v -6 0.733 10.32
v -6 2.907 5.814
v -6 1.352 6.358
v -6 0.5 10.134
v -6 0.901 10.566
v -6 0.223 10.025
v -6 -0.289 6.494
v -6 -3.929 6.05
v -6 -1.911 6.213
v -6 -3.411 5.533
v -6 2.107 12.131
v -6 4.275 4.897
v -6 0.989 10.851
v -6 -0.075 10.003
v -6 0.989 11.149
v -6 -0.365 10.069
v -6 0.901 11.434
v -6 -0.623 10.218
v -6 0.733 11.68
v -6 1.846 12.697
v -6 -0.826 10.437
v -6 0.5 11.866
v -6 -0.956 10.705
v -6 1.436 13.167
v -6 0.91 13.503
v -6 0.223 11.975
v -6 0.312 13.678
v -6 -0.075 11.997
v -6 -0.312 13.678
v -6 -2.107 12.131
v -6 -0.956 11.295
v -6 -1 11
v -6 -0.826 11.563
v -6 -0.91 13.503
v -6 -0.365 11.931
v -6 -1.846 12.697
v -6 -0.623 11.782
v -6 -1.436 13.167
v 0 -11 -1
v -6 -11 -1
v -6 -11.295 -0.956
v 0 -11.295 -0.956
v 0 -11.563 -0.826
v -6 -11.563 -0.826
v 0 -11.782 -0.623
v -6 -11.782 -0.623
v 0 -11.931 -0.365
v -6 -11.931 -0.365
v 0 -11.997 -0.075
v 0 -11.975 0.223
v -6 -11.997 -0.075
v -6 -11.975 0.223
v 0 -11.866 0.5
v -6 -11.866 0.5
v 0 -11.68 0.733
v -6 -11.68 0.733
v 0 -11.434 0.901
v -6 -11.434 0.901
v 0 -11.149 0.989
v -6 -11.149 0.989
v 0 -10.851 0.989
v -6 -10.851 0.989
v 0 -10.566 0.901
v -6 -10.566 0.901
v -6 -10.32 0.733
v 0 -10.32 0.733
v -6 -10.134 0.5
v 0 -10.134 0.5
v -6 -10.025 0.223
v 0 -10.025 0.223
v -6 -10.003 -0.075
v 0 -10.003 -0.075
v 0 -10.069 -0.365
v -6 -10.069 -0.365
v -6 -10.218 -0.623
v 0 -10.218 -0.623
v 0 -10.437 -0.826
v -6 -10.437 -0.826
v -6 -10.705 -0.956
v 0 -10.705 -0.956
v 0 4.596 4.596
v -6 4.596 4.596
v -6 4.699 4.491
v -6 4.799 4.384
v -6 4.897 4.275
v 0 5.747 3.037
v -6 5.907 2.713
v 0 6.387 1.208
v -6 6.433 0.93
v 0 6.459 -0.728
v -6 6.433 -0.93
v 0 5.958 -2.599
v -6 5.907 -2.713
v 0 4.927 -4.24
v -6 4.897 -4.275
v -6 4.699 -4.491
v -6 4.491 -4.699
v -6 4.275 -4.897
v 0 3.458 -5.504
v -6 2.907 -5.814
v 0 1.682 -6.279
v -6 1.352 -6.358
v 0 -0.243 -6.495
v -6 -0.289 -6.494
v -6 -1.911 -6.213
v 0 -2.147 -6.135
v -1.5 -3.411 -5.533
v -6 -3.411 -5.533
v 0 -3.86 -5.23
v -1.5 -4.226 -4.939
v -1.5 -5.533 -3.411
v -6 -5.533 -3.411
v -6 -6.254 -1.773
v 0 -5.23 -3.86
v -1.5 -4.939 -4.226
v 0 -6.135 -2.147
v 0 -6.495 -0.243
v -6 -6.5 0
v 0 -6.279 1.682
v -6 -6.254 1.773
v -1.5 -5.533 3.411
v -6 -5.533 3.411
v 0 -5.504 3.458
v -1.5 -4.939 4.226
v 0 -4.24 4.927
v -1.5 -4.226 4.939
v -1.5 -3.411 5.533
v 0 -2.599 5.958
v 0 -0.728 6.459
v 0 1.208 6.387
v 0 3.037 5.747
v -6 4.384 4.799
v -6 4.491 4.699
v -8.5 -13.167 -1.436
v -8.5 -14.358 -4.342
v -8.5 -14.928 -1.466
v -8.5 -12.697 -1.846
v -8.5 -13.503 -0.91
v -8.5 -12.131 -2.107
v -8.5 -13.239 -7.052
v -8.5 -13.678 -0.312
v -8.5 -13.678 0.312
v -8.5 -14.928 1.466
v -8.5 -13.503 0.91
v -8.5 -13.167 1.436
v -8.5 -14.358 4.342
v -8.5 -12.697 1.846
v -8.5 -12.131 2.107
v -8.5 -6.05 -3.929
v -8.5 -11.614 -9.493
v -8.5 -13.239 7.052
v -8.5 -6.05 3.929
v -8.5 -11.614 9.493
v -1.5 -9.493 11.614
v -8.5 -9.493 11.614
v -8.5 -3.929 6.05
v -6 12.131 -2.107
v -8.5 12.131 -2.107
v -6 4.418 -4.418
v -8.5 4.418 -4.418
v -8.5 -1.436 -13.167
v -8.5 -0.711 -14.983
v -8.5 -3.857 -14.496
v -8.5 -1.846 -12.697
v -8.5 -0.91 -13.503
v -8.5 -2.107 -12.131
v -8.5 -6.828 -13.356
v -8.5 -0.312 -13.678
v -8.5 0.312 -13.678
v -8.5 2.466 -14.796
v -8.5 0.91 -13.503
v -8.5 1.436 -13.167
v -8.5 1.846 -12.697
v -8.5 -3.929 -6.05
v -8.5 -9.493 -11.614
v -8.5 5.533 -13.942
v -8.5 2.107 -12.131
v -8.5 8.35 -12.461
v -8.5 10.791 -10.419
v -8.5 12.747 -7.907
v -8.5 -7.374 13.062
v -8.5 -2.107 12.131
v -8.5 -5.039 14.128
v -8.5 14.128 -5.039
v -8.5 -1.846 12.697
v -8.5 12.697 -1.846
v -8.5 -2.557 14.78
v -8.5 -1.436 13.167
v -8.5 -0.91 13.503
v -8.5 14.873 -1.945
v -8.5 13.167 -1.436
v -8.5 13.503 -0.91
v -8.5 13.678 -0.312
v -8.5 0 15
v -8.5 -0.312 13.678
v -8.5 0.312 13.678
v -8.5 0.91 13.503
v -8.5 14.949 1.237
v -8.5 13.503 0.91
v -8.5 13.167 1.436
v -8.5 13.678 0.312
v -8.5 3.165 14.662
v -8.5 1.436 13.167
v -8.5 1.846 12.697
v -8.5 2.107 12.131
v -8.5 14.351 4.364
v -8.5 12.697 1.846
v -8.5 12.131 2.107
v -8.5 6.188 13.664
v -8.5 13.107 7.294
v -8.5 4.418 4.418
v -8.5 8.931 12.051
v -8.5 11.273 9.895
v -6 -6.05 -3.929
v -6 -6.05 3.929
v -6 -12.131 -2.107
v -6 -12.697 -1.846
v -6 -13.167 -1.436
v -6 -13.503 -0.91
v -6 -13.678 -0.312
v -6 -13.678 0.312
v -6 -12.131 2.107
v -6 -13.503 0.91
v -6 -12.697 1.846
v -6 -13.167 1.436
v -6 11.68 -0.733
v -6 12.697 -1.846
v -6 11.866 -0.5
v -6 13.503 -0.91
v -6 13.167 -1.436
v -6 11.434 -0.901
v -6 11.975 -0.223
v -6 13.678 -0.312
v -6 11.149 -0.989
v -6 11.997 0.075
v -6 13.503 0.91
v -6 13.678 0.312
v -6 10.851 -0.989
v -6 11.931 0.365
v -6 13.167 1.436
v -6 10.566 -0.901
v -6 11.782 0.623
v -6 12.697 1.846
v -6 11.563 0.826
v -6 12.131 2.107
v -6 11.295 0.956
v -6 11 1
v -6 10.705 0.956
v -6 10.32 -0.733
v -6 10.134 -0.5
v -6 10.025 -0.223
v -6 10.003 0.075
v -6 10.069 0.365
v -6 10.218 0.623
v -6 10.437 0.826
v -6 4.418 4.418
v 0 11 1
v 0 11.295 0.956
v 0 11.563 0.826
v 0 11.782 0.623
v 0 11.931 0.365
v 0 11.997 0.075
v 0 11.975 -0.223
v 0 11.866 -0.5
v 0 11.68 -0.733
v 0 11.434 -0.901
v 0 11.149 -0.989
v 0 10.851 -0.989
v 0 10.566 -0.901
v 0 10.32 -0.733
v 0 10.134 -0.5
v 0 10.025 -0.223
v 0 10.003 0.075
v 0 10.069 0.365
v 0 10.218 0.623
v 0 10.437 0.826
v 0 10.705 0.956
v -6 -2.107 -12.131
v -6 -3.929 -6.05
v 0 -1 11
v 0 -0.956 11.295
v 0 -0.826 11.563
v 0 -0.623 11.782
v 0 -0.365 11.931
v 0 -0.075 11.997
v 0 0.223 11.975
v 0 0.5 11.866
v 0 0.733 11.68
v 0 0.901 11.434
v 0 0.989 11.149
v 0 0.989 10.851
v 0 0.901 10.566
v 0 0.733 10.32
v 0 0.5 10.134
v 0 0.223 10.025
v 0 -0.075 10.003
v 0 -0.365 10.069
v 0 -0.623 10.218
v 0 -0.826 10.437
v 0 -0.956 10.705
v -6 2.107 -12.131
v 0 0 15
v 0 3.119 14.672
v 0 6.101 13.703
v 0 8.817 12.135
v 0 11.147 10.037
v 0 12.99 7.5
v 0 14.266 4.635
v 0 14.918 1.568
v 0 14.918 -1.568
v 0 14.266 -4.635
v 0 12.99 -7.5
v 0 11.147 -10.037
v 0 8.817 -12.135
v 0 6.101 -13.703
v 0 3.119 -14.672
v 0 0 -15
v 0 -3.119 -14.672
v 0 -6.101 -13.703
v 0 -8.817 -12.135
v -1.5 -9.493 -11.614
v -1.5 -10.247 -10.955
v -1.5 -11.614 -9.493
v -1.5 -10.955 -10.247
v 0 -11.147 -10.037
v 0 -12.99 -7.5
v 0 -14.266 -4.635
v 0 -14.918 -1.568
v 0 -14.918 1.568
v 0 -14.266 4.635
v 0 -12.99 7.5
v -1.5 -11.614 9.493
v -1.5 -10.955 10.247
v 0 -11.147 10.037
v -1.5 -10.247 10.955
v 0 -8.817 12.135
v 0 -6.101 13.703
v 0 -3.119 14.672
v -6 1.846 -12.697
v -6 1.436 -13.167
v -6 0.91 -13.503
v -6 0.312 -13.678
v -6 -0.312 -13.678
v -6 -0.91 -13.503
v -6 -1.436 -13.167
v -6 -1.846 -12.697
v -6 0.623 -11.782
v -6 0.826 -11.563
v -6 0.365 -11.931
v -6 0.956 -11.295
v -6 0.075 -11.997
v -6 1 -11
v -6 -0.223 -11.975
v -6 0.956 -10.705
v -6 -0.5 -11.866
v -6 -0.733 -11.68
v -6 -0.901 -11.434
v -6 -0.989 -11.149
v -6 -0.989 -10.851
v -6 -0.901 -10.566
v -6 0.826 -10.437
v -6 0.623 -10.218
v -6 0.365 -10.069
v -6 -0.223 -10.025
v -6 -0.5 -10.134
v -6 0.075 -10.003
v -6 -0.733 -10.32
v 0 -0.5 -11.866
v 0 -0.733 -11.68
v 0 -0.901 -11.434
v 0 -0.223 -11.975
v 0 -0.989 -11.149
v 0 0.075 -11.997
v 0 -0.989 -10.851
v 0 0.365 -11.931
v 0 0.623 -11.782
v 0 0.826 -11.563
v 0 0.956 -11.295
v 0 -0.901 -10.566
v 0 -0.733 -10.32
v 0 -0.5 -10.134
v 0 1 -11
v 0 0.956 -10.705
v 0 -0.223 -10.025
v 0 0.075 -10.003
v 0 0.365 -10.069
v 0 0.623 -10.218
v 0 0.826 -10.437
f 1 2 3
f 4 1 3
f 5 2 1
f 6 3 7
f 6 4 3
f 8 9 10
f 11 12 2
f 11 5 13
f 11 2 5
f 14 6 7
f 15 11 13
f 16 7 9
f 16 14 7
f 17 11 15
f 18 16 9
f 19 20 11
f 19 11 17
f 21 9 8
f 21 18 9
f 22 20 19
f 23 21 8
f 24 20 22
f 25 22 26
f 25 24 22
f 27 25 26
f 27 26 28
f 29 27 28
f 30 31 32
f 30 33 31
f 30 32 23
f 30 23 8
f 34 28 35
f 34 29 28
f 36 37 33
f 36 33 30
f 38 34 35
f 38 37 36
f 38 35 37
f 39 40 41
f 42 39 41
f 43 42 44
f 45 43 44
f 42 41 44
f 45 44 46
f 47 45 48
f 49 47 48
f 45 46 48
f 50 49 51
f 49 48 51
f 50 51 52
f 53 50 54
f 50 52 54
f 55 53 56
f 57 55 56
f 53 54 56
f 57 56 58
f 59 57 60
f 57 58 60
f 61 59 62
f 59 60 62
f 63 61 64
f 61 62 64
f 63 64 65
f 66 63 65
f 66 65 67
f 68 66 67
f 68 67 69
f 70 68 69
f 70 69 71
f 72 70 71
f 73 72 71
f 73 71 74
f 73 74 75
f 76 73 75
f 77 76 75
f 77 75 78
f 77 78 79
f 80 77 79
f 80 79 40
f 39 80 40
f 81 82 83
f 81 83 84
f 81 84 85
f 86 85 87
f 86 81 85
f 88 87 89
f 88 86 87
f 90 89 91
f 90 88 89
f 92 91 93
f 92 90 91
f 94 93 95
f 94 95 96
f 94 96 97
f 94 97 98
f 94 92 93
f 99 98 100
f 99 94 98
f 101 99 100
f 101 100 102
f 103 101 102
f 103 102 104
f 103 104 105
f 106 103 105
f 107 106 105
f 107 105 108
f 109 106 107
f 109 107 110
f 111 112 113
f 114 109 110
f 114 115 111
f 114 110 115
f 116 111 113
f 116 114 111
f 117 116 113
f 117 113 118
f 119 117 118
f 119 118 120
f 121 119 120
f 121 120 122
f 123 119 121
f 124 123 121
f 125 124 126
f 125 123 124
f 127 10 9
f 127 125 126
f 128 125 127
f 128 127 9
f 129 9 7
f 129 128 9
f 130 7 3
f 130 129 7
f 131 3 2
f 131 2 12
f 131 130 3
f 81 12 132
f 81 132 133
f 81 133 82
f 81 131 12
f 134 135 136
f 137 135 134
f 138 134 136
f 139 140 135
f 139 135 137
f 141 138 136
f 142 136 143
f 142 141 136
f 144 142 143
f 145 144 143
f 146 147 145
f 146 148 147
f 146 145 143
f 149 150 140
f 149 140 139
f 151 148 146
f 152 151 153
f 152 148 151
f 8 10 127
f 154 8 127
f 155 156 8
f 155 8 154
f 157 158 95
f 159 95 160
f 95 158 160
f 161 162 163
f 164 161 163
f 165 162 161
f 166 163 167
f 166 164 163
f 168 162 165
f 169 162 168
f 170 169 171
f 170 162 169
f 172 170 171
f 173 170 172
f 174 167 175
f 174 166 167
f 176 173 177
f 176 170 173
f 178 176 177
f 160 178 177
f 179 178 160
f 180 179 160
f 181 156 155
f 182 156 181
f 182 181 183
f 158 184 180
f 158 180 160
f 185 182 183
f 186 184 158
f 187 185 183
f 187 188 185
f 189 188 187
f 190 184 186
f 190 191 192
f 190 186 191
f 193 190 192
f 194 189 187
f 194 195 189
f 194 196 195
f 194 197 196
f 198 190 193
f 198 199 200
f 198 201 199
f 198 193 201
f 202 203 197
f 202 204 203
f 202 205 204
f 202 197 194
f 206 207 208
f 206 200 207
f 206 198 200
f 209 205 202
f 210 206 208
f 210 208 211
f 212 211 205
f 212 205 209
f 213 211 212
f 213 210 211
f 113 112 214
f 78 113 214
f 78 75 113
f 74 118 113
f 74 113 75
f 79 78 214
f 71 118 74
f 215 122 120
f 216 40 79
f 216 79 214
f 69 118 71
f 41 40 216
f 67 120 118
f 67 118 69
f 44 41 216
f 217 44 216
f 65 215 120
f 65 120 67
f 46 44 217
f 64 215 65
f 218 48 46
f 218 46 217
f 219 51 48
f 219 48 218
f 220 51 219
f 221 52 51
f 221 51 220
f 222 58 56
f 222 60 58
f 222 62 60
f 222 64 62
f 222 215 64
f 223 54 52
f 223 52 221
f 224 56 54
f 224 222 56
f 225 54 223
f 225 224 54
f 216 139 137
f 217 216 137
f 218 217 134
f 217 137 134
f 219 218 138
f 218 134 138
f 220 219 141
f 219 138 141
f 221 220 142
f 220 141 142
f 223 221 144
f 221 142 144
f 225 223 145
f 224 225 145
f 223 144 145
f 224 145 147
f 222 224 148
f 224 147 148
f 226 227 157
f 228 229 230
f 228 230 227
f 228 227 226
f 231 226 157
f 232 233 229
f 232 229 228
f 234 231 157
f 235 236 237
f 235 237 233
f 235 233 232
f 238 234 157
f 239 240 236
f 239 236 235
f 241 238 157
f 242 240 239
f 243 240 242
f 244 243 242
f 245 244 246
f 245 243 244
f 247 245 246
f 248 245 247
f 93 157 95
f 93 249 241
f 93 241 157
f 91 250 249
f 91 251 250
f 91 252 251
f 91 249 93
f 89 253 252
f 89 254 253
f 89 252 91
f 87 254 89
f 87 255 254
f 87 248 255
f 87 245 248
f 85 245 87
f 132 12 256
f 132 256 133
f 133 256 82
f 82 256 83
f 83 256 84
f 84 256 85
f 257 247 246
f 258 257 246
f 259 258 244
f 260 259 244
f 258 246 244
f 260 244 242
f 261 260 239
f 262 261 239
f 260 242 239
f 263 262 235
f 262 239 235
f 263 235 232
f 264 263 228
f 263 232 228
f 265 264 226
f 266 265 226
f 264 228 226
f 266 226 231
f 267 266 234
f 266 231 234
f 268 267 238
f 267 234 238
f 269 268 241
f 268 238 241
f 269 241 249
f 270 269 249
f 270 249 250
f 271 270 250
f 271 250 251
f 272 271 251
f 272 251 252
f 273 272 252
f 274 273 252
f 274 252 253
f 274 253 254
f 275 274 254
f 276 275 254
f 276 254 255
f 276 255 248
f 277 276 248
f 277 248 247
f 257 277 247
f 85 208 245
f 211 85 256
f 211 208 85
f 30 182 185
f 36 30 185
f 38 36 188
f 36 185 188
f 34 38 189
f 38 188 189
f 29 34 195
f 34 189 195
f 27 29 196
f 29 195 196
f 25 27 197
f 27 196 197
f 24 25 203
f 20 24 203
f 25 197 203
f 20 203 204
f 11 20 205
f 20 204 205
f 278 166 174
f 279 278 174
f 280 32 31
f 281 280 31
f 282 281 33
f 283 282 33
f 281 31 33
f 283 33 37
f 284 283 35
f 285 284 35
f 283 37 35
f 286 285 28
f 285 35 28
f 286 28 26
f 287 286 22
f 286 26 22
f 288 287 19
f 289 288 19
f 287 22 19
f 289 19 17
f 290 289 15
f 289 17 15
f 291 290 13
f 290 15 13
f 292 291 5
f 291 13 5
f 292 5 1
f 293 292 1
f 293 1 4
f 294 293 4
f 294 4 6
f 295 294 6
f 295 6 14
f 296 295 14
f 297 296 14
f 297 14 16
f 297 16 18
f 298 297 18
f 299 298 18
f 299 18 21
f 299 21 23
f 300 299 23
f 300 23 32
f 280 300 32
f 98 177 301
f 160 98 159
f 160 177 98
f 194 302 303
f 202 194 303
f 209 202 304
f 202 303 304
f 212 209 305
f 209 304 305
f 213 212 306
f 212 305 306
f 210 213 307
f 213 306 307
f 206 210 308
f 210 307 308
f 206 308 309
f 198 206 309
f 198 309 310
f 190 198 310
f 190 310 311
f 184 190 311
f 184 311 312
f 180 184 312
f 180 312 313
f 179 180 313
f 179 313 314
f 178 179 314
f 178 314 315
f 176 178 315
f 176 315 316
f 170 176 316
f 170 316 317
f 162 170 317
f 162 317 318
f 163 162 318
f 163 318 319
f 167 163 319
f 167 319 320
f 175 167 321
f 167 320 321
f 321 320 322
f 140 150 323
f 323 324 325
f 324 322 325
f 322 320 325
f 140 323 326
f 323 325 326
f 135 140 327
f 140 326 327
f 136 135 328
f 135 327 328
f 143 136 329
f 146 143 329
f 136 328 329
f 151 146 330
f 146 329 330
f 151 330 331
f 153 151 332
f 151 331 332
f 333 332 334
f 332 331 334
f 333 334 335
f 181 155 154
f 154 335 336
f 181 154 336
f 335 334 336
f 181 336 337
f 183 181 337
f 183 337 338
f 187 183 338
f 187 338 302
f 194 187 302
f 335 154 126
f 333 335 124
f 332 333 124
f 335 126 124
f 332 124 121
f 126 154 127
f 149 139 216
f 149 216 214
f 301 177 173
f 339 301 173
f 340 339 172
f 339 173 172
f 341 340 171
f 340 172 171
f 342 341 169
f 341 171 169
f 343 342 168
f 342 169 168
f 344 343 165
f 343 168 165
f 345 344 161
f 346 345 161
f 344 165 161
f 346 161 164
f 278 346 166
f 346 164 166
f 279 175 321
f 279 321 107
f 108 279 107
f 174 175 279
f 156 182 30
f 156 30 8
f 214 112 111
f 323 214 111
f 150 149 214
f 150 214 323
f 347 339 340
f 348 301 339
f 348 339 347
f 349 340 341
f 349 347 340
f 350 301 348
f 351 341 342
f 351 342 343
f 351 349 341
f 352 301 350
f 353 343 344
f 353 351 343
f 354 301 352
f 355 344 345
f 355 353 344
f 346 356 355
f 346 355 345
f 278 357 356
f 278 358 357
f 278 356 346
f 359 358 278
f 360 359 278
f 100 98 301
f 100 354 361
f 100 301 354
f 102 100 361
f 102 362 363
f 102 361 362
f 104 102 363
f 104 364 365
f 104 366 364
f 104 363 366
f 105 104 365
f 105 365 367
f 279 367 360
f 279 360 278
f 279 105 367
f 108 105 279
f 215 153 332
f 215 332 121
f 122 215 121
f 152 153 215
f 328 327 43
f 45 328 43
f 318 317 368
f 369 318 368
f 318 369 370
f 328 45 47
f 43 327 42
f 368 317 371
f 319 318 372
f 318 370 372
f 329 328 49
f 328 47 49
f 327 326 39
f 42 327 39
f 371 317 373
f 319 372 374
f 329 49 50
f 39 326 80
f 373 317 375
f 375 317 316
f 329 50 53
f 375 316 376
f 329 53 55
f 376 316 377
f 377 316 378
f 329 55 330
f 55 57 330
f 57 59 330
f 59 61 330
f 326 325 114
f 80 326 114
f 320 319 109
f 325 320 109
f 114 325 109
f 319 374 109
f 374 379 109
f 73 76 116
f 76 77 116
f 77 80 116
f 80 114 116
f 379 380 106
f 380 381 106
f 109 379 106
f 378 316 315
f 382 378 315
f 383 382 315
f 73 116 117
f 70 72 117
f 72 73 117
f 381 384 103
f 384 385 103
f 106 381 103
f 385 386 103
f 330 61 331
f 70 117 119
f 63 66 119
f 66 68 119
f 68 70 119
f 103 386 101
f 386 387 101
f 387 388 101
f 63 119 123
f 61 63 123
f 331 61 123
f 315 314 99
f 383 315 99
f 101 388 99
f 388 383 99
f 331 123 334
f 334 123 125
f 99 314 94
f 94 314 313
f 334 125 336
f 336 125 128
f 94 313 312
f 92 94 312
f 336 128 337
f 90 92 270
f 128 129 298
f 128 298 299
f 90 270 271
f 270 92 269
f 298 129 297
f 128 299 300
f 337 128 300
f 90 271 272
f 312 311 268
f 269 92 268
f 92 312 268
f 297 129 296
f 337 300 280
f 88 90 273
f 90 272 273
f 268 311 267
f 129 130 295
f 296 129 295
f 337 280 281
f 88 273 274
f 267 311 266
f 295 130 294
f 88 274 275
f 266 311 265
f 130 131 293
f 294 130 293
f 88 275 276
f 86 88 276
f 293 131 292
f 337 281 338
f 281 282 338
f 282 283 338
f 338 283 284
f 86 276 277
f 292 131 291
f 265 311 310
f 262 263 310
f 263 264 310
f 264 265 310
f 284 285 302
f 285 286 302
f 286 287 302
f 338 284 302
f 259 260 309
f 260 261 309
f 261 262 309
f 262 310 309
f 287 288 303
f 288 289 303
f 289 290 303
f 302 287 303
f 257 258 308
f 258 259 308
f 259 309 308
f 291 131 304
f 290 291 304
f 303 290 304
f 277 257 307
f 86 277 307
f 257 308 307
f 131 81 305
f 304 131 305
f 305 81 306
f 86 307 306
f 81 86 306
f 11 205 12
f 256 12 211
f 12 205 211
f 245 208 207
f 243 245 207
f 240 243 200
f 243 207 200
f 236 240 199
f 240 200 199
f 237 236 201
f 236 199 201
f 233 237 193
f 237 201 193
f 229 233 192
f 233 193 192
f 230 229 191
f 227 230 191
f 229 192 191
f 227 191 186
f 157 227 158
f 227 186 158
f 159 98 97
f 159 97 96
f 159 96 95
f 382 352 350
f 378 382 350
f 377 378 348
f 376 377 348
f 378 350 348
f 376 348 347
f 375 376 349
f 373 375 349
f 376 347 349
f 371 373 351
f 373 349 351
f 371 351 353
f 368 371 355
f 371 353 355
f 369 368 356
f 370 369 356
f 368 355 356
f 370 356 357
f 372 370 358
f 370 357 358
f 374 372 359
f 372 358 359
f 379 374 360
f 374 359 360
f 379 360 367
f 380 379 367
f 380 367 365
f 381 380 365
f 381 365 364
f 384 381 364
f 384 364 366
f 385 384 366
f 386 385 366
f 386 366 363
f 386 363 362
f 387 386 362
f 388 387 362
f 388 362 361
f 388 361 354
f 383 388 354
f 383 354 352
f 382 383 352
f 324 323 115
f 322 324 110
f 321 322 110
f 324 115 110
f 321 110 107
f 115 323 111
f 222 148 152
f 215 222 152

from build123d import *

# Parameters (mm, degrees)
SKETCH075_R             = 6.5
SKETCH075_R_2           = 2.5
PAD039_DEPTH            = 6
SKETCH076_R             = 5
SKETCH076_R_2           = 2.522437
PAD040_DEPTH            = 7
SKETCH077_R             = 6.5
SKETCH077_R_2           = 2.522437
PAD041_DEPTH            = 1
SKETCH078_R             = 1
PAD042_DEPTH            = 7
BODY025_ROLL_ANGLE      = 135
BODY025_PLACEMENT_ANGLE = 180
SKETCH082_R             = 15
PAD043_DEPTH            = 8.5
POCKET027_DEPTH         = 2.5
POLARPATTERN019_COUNT   = 4
SKETCH079_R             = 1
HOLE007_DEPTH           = 25
POLARPATTERN018_COUNT   = 4
SKETCH080_R             = 4
POCKET026_DEPTH         = 6.001
BODY026_PLACEMENT_ANGLE = 90
POCKET028_DEPTH         = 7
POLARPATTERN020_COUNT   = 2
POLARPATTERN020_ANGLE   = 90


with BuildPart() as polea006:
    # Sketch075 → Pad039 (new body)
    with BuildSketch(Plane.YZ):
        Circle(SKETCH075_R)
        Circle(SKETCH075_R_2, mode=Mode.SUBTRACT)
    extrude(amount=PAD039_DEPTH)

    # Sketch076 (on Face3 of Pad039) → Pad040 (join)
    with BuildSketch(Plane(origin=(0, 0, 0), x_dir=(0, 1, 0), z_dir=(-1, 0, 0))):
        Circle(SKETCH076_R)
        Circle(SKETCH076_R_2, mode=Mode.SUBTRACT)
    extrude(amount=PAD040_DEPTH)

    # Sketch077 (on Face6 of Pad040) → Pad041 (join)
    with BuildSketch(Plane(origin=(-7, 0, 0), x_dir=(0, 1, 0), z_dir=(-1, 0, 0))):
        Circle(SKETCH077_R)
        Circle(SKETCH077_R_2, mode=Mode.SUBTRACT)
    extrude(amount=PAD041_DEPTH)

    # Sketch078 → Pad042 (join)
    with BuildSketch(Plane.XZ):
        with Locations((3, 0)):
            Circle(SKETCH078_R)
    extrude(amount=PAD042_DEPTH)


with BuildPart() as polea006_1:
    # Body025 roll: moved
    add(polea006.part.rotate(Axis((0, 0, 0), (1, 0, 0)), BODY025_ROLL_ANGLE))


with BuildPart() as polea006_2:
    # Body025 placement: moved
    add(polea006_1.part.rotate(Axis((0, 0, 0), (0, 0, 1)), BODY025_PLACEMENT_ANGLE))


with BuildPart() as body027:
    # Sketch082 → Pad043 (new body)
    with BuildSketch(Plane.XY):
        Circle(SKETCH082_R)
    extrude(amount=PAD043_DEPTH)

    # Sketch081 (on Face3 of Pad043) → Pocket027 (cut)
    with BuildSketch(Plane.XY.offset(8.5)):
        with BuildLine():
            ThreePointArc((-5.26869, 1.578261), (0, -5.5), (5.26869, 1.578261))
            Line((2.107476, 12.131304), (5.26869, 1.578261))
            ThreePointArc((2.107476, 12.131304), (0, 13.7), (-2.107476, 12.131304))
            Line((-2.107476, 12.131304), (-5.26869, 1.578261))
        make_face()
    pocket027 = extrude(amount=-POCKET027_DEPTH, mode=Mode.SUBTRACT)

    # PolarPattern019: Pocket027 ×4 about axis
    polarpattern019_axis = Axis((0, 0, 8.5), (0, 0, 1))
    for i in range(1, POLARPATTERN019_COUNT):
        add(pocket027.rotate(polarpattern019_axis, i * 360 / POLARPATTERN019_COUNT), mode=Mode.SUBTRACT)

    # Sketch079 (on Face21 of PolarPattern019) → Hole007 (cut)
    with BuildSketch(Plane.XY.offset(6)):
        with Locations((0, 11)):
            Circle(SKETCH079_R)
    hole007 = extrude(amount=-HOLE007_DEPTH, mode=Mode.SUBTRACT)

    # PolarPattern018: Hole007 ×4 about axis
    polarpattern018_axis = Axis((0, 0, 6), (0, 0, 1))
    for i in range(1, POLARPATTERN018_COUNT):
        add(hole007.rotate(polarpattern018_axis, i * 360 / POLARPATTERN018_COUNT), mode=Mode.SUBTRACT)

    # Sketch080 (on Face25 of PolarPattern018) → Pocket026 (cut, through all)
    with BuildSketch(Plane.XY.offset(6)):
        Circle(SKETCH080_R)
    extrude(amount=-POCKET026_DEPTH, mode=Mode.SUBTRACT)


with BuildPart() as body027_1:
    # Body026 placement: moved
    add(body027.part.moved(Location((0, 0, 0))).rotate(Axis((0, 0, 0), (0, -1, 0)), BODY026_PLACEMENT_ANGLE))

    # Cut004: cut polea006
    add(polea006_2.part, mode=Mode.SUBTRACT)

    # Sketch083 (on Face3 of BaseFeature004) → Pocket028 (cut)
    with BuildSketch(Plane(origin=(-8.5, 0, 0), x_dir=(0, -1, 0), z_dir=(-1, 0, 0))):
        Polygon((2.474874, -4.596194), (4.596194, -2.474874), (12.374369, -10.253048), (10.253048, -12.374369), align=None)
    pocket028 = extrude(amount=-POCKET028_DEPTH, mode=Mode.SUBTRACT)

    # PolarPattern020: Pocket028 ×2 about axis
    polarpattern020_axis = Axis((-8.5, 0, 0), (-1, 0, 0))
    for i in range(1, POLARPATTERN020_COUNT):
        add(pocket028.rotate(polarpattern020_axis, i * POLARPATTERN020_ANGLE / (POLARPATTERN020_COUNT - 1)), mode=Mode.SUBTRACT)


solid = body027_1.part
